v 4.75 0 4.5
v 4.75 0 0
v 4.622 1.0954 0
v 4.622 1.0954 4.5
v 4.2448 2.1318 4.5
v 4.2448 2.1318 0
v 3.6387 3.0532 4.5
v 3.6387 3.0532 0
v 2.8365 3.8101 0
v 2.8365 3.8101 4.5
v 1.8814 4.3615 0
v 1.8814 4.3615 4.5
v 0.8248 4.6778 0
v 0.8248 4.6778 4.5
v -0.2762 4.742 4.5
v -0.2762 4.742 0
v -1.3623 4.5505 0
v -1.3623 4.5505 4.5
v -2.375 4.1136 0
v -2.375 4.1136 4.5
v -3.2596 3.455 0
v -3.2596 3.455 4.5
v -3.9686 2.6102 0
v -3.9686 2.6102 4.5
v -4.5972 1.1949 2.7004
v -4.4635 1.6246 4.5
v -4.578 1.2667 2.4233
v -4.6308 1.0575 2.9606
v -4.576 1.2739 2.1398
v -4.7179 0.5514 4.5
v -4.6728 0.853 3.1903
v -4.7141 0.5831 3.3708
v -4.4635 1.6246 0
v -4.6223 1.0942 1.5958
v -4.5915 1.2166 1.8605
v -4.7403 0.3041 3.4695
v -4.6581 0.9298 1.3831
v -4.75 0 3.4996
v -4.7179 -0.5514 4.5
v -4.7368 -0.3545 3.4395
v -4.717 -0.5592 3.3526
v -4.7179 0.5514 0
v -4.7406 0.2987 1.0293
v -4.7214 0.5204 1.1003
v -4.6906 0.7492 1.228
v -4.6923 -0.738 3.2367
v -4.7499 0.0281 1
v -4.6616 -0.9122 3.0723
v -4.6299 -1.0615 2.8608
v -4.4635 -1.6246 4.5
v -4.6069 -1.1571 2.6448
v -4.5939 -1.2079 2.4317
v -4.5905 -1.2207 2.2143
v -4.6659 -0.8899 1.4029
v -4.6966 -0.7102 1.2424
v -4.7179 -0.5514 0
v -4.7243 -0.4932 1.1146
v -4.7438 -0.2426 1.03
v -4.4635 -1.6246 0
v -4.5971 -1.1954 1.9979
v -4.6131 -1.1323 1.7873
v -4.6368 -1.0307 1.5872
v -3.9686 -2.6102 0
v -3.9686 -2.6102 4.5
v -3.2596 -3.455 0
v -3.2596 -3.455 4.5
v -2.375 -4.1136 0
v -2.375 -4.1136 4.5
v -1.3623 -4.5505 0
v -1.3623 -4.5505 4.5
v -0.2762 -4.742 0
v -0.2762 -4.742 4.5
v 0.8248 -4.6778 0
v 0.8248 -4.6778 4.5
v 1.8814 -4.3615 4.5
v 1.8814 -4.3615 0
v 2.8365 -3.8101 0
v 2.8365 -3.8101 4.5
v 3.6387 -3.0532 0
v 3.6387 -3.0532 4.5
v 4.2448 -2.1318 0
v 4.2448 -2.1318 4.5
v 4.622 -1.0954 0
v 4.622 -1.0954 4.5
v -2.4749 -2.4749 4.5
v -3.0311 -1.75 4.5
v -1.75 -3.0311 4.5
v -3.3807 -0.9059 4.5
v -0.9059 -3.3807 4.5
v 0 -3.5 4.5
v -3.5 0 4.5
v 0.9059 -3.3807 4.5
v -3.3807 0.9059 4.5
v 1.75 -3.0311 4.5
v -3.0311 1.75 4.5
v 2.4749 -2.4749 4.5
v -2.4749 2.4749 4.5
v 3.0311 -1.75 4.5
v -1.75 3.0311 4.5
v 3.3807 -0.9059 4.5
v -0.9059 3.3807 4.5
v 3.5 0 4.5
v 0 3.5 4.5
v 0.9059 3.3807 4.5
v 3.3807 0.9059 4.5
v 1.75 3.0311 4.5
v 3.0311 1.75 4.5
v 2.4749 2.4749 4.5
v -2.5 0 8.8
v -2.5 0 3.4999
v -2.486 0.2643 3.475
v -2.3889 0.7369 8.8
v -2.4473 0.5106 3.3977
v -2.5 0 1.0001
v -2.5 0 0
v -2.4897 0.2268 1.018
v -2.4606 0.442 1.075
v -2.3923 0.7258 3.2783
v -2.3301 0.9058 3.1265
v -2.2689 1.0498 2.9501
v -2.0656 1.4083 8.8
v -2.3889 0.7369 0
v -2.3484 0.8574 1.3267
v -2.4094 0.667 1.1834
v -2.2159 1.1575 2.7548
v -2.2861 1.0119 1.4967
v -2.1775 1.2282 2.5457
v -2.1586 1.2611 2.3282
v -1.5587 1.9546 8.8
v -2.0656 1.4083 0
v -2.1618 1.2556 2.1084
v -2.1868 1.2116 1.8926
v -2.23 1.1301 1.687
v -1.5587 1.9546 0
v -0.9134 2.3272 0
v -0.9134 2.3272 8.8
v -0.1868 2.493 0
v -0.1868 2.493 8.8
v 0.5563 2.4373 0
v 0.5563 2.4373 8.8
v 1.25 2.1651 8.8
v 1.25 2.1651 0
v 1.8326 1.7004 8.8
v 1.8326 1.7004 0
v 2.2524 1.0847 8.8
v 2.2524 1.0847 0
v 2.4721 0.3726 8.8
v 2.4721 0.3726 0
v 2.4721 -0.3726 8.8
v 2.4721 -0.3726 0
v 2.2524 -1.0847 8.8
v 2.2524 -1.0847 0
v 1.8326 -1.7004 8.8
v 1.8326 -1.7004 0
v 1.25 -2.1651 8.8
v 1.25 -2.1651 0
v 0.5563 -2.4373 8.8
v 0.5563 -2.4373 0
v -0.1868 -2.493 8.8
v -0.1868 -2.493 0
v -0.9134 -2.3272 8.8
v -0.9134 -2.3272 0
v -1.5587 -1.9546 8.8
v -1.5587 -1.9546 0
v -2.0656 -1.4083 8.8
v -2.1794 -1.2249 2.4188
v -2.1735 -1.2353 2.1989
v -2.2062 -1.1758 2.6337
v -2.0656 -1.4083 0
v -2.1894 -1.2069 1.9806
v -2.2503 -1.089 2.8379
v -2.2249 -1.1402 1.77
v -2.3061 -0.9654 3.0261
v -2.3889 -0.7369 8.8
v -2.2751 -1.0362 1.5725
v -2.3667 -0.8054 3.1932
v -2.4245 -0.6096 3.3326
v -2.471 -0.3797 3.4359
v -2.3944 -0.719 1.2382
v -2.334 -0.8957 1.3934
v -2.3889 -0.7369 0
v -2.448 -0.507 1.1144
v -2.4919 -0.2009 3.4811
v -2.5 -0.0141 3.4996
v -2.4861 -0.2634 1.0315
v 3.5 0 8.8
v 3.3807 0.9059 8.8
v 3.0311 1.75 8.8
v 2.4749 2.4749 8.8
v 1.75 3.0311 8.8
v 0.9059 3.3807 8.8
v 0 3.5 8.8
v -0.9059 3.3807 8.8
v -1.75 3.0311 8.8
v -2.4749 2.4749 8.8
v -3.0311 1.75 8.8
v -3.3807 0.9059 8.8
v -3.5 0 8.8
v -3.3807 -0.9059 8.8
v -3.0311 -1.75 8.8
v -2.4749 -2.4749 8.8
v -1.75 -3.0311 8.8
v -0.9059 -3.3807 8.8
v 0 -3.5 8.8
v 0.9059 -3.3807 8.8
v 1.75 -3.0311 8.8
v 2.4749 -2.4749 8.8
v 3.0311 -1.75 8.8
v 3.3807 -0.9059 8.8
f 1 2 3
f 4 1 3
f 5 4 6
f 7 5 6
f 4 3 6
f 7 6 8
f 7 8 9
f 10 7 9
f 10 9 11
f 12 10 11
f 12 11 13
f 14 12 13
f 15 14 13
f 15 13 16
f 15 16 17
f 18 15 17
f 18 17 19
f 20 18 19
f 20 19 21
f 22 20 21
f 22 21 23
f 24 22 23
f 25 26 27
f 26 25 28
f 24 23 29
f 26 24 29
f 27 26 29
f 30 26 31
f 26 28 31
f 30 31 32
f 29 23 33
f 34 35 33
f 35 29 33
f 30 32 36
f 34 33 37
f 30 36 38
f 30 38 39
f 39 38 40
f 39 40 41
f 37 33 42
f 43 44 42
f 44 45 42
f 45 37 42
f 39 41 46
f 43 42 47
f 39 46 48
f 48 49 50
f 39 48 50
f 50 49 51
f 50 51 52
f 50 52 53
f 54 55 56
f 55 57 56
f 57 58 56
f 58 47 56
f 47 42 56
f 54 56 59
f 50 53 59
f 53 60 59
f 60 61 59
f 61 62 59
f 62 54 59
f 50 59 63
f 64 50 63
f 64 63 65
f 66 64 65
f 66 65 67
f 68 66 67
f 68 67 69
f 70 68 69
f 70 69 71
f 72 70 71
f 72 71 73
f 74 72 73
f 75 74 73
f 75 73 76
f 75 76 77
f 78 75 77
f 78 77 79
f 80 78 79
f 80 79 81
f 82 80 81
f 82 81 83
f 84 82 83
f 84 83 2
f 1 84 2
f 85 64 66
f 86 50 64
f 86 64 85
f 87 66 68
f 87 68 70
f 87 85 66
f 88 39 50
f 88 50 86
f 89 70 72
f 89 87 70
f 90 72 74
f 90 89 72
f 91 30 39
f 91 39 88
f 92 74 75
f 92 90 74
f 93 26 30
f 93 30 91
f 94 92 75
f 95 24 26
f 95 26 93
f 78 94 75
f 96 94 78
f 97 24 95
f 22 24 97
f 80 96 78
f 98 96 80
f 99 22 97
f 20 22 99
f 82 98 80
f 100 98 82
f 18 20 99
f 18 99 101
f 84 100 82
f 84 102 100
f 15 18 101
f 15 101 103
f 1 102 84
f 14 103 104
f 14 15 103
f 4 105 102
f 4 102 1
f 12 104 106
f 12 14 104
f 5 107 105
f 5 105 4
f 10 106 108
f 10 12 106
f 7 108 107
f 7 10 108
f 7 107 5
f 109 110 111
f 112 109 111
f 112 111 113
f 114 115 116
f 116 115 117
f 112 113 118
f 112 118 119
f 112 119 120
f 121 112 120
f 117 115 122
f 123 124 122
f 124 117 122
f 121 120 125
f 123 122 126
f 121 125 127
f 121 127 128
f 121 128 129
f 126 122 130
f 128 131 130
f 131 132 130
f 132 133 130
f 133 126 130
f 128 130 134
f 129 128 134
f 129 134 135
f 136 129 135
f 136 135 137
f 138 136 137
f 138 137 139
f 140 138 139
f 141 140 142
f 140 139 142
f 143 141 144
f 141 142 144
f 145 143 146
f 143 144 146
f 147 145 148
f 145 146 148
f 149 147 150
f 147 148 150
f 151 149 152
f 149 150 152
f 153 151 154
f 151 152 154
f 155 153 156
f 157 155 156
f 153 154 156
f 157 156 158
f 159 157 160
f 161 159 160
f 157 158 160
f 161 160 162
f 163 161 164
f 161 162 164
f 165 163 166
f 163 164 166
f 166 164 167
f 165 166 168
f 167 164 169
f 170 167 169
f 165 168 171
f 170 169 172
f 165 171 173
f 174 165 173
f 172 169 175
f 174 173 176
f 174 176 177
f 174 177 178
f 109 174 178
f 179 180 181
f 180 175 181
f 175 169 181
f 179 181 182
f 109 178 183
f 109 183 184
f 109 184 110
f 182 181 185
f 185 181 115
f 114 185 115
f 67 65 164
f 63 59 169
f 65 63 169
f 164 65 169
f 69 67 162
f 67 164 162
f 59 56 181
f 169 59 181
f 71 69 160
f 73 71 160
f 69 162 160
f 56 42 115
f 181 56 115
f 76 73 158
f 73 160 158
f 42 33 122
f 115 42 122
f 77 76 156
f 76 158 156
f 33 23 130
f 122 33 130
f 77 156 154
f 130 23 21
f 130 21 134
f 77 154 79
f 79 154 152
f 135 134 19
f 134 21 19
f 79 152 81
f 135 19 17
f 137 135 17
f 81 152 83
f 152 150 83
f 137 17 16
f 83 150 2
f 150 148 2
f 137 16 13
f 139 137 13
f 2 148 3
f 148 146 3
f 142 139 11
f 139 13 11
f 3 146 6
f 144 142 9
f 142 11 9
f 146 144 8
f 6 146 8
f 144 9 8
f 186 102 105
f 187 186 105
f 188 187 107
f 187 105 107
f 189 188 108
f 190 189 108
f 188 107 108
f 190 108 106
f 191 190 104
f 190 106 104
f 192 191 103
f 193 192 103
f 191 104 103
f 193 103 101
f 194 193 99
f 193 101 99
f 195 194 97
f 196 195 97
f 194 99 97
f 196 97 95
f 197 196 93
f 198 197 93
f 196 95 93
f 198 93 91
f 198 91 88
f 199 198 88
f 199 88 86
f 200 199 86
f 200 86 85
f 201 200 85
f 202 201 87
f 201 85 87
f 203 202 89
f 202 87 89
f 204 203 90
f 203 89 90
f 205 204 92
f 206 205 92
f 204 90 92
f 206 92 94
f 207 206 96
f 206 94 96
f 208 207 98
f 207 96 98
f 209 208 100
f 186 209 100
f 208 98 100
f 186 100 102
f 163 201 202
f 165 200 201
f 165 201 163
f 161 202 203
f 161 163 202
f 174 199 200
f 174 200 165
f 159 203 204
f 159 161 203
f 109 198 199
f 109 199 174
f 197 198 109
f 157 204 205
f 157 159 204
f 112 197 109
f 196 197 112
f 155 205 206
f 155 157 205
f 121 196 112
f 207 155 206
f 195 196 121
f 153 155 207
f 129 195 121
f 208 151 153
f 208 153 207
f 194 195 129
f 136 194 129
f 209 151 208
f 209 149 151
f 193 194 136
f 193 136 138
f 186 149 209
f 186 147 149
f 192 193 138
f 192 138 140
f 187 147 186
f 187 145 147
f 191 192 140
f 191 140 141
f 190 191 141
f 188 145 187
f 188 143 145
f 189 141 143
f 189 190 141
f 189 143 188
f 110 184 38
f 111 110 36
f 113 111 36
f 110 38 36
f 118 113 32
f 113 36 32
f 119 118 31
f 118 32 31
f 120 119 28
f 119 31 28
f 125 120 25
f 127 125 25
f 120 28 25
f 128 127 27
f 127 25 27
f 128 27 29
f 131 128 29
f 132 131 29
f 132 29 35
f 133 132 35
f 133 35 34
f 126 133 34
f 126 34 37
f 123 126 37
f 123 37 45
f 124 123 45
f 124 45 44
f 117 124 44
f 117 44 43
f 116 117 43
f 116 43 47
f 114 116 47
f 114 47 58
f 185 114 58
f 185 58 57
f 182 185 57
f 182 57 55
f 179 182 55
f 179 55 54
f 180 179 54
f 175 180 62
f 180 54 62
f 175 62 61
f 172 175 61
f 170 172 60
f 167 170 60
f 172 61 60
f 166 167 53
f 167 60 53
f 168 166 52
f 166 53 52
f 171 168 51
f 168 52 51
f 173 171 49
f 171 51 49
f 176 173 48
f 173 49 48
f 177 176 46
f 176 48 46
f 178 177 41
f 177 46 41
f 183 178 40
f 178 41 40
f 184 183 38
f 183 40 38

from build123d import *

# Parameters (mm, degrees)
ESQUISSE1_R             = 4.75
BOSS_EXTRU_1_DEPTH      = 8.8
ENL_V_START             = -4.3
ESQUISSE2_R             = 4.75
ESQUISSE2_R_2           = 3.5
ENL_V_MAT_EXTRU_1_DEPTH = 4.3
ESQUISSE3_R             = 2.5
ENL_V_MAT_EXTRU_2_DEPTH = 12.070907822
ESQUISSE5_R             = 1.25
ENL_V_MAT_EXTRU_3_DEPTH = 5


with BuildPart() as part:
    # Esquisse1 → Boss.-Extru.1 (new body)
    with BuildSketch(Plane.XY):
        Circle(ESQUISSE1_R)
    extrude(amount=BOSS_EXTRU_1_DEPTH)

    # Esquisse2 → Enlèv. mat.-Extru.1 (cut)
    with BuildSketch(Plane.XY.offset(8.8).offset(ENL_V_START)):
        Circle(ESQUISSE2_R)
        Circle(ESQUISSE2_R_2, mode=Mode.SUBTRACT)
    extrude(amount=ENL_V_MAT_EXTRU_1_DEPTH, mode=Mode.SUBTRACT)

    # Esquisse3 → Enlèv. mat.-Extru.2 (cut, through all)
    with BuildSketch(Plane(origin=(0, 0, 0), x_dir=(-1, 0, 0), z_dir=(0, 0, -1))):
        Circle(ESQUISSE3_R)
    extrude(amount=-ENL_V_MAT_EXTRU_2_DEPTH, mode=Mode.SUBTRACT)

    # Esquisse5 → Enlèv. mat.-Extru.3 (cut)
    with BuildSketch(Plane(origin=(-4.749906239, 0.029844934, 2.25), x_dir=(0, 0, 1), z_dir=(-0.9999802608561372, 0.006283143965558953, 0))):
        with Locations(Location((0, 0, 0), (0, 0, 358.631878995))):
            Circle(ESQUISSE5_R)
    extrude(amount=-ENL_V_MAT_EXTRU_3_DEPTH, mode=Mode.SUBTRACT)


solid = part.part
